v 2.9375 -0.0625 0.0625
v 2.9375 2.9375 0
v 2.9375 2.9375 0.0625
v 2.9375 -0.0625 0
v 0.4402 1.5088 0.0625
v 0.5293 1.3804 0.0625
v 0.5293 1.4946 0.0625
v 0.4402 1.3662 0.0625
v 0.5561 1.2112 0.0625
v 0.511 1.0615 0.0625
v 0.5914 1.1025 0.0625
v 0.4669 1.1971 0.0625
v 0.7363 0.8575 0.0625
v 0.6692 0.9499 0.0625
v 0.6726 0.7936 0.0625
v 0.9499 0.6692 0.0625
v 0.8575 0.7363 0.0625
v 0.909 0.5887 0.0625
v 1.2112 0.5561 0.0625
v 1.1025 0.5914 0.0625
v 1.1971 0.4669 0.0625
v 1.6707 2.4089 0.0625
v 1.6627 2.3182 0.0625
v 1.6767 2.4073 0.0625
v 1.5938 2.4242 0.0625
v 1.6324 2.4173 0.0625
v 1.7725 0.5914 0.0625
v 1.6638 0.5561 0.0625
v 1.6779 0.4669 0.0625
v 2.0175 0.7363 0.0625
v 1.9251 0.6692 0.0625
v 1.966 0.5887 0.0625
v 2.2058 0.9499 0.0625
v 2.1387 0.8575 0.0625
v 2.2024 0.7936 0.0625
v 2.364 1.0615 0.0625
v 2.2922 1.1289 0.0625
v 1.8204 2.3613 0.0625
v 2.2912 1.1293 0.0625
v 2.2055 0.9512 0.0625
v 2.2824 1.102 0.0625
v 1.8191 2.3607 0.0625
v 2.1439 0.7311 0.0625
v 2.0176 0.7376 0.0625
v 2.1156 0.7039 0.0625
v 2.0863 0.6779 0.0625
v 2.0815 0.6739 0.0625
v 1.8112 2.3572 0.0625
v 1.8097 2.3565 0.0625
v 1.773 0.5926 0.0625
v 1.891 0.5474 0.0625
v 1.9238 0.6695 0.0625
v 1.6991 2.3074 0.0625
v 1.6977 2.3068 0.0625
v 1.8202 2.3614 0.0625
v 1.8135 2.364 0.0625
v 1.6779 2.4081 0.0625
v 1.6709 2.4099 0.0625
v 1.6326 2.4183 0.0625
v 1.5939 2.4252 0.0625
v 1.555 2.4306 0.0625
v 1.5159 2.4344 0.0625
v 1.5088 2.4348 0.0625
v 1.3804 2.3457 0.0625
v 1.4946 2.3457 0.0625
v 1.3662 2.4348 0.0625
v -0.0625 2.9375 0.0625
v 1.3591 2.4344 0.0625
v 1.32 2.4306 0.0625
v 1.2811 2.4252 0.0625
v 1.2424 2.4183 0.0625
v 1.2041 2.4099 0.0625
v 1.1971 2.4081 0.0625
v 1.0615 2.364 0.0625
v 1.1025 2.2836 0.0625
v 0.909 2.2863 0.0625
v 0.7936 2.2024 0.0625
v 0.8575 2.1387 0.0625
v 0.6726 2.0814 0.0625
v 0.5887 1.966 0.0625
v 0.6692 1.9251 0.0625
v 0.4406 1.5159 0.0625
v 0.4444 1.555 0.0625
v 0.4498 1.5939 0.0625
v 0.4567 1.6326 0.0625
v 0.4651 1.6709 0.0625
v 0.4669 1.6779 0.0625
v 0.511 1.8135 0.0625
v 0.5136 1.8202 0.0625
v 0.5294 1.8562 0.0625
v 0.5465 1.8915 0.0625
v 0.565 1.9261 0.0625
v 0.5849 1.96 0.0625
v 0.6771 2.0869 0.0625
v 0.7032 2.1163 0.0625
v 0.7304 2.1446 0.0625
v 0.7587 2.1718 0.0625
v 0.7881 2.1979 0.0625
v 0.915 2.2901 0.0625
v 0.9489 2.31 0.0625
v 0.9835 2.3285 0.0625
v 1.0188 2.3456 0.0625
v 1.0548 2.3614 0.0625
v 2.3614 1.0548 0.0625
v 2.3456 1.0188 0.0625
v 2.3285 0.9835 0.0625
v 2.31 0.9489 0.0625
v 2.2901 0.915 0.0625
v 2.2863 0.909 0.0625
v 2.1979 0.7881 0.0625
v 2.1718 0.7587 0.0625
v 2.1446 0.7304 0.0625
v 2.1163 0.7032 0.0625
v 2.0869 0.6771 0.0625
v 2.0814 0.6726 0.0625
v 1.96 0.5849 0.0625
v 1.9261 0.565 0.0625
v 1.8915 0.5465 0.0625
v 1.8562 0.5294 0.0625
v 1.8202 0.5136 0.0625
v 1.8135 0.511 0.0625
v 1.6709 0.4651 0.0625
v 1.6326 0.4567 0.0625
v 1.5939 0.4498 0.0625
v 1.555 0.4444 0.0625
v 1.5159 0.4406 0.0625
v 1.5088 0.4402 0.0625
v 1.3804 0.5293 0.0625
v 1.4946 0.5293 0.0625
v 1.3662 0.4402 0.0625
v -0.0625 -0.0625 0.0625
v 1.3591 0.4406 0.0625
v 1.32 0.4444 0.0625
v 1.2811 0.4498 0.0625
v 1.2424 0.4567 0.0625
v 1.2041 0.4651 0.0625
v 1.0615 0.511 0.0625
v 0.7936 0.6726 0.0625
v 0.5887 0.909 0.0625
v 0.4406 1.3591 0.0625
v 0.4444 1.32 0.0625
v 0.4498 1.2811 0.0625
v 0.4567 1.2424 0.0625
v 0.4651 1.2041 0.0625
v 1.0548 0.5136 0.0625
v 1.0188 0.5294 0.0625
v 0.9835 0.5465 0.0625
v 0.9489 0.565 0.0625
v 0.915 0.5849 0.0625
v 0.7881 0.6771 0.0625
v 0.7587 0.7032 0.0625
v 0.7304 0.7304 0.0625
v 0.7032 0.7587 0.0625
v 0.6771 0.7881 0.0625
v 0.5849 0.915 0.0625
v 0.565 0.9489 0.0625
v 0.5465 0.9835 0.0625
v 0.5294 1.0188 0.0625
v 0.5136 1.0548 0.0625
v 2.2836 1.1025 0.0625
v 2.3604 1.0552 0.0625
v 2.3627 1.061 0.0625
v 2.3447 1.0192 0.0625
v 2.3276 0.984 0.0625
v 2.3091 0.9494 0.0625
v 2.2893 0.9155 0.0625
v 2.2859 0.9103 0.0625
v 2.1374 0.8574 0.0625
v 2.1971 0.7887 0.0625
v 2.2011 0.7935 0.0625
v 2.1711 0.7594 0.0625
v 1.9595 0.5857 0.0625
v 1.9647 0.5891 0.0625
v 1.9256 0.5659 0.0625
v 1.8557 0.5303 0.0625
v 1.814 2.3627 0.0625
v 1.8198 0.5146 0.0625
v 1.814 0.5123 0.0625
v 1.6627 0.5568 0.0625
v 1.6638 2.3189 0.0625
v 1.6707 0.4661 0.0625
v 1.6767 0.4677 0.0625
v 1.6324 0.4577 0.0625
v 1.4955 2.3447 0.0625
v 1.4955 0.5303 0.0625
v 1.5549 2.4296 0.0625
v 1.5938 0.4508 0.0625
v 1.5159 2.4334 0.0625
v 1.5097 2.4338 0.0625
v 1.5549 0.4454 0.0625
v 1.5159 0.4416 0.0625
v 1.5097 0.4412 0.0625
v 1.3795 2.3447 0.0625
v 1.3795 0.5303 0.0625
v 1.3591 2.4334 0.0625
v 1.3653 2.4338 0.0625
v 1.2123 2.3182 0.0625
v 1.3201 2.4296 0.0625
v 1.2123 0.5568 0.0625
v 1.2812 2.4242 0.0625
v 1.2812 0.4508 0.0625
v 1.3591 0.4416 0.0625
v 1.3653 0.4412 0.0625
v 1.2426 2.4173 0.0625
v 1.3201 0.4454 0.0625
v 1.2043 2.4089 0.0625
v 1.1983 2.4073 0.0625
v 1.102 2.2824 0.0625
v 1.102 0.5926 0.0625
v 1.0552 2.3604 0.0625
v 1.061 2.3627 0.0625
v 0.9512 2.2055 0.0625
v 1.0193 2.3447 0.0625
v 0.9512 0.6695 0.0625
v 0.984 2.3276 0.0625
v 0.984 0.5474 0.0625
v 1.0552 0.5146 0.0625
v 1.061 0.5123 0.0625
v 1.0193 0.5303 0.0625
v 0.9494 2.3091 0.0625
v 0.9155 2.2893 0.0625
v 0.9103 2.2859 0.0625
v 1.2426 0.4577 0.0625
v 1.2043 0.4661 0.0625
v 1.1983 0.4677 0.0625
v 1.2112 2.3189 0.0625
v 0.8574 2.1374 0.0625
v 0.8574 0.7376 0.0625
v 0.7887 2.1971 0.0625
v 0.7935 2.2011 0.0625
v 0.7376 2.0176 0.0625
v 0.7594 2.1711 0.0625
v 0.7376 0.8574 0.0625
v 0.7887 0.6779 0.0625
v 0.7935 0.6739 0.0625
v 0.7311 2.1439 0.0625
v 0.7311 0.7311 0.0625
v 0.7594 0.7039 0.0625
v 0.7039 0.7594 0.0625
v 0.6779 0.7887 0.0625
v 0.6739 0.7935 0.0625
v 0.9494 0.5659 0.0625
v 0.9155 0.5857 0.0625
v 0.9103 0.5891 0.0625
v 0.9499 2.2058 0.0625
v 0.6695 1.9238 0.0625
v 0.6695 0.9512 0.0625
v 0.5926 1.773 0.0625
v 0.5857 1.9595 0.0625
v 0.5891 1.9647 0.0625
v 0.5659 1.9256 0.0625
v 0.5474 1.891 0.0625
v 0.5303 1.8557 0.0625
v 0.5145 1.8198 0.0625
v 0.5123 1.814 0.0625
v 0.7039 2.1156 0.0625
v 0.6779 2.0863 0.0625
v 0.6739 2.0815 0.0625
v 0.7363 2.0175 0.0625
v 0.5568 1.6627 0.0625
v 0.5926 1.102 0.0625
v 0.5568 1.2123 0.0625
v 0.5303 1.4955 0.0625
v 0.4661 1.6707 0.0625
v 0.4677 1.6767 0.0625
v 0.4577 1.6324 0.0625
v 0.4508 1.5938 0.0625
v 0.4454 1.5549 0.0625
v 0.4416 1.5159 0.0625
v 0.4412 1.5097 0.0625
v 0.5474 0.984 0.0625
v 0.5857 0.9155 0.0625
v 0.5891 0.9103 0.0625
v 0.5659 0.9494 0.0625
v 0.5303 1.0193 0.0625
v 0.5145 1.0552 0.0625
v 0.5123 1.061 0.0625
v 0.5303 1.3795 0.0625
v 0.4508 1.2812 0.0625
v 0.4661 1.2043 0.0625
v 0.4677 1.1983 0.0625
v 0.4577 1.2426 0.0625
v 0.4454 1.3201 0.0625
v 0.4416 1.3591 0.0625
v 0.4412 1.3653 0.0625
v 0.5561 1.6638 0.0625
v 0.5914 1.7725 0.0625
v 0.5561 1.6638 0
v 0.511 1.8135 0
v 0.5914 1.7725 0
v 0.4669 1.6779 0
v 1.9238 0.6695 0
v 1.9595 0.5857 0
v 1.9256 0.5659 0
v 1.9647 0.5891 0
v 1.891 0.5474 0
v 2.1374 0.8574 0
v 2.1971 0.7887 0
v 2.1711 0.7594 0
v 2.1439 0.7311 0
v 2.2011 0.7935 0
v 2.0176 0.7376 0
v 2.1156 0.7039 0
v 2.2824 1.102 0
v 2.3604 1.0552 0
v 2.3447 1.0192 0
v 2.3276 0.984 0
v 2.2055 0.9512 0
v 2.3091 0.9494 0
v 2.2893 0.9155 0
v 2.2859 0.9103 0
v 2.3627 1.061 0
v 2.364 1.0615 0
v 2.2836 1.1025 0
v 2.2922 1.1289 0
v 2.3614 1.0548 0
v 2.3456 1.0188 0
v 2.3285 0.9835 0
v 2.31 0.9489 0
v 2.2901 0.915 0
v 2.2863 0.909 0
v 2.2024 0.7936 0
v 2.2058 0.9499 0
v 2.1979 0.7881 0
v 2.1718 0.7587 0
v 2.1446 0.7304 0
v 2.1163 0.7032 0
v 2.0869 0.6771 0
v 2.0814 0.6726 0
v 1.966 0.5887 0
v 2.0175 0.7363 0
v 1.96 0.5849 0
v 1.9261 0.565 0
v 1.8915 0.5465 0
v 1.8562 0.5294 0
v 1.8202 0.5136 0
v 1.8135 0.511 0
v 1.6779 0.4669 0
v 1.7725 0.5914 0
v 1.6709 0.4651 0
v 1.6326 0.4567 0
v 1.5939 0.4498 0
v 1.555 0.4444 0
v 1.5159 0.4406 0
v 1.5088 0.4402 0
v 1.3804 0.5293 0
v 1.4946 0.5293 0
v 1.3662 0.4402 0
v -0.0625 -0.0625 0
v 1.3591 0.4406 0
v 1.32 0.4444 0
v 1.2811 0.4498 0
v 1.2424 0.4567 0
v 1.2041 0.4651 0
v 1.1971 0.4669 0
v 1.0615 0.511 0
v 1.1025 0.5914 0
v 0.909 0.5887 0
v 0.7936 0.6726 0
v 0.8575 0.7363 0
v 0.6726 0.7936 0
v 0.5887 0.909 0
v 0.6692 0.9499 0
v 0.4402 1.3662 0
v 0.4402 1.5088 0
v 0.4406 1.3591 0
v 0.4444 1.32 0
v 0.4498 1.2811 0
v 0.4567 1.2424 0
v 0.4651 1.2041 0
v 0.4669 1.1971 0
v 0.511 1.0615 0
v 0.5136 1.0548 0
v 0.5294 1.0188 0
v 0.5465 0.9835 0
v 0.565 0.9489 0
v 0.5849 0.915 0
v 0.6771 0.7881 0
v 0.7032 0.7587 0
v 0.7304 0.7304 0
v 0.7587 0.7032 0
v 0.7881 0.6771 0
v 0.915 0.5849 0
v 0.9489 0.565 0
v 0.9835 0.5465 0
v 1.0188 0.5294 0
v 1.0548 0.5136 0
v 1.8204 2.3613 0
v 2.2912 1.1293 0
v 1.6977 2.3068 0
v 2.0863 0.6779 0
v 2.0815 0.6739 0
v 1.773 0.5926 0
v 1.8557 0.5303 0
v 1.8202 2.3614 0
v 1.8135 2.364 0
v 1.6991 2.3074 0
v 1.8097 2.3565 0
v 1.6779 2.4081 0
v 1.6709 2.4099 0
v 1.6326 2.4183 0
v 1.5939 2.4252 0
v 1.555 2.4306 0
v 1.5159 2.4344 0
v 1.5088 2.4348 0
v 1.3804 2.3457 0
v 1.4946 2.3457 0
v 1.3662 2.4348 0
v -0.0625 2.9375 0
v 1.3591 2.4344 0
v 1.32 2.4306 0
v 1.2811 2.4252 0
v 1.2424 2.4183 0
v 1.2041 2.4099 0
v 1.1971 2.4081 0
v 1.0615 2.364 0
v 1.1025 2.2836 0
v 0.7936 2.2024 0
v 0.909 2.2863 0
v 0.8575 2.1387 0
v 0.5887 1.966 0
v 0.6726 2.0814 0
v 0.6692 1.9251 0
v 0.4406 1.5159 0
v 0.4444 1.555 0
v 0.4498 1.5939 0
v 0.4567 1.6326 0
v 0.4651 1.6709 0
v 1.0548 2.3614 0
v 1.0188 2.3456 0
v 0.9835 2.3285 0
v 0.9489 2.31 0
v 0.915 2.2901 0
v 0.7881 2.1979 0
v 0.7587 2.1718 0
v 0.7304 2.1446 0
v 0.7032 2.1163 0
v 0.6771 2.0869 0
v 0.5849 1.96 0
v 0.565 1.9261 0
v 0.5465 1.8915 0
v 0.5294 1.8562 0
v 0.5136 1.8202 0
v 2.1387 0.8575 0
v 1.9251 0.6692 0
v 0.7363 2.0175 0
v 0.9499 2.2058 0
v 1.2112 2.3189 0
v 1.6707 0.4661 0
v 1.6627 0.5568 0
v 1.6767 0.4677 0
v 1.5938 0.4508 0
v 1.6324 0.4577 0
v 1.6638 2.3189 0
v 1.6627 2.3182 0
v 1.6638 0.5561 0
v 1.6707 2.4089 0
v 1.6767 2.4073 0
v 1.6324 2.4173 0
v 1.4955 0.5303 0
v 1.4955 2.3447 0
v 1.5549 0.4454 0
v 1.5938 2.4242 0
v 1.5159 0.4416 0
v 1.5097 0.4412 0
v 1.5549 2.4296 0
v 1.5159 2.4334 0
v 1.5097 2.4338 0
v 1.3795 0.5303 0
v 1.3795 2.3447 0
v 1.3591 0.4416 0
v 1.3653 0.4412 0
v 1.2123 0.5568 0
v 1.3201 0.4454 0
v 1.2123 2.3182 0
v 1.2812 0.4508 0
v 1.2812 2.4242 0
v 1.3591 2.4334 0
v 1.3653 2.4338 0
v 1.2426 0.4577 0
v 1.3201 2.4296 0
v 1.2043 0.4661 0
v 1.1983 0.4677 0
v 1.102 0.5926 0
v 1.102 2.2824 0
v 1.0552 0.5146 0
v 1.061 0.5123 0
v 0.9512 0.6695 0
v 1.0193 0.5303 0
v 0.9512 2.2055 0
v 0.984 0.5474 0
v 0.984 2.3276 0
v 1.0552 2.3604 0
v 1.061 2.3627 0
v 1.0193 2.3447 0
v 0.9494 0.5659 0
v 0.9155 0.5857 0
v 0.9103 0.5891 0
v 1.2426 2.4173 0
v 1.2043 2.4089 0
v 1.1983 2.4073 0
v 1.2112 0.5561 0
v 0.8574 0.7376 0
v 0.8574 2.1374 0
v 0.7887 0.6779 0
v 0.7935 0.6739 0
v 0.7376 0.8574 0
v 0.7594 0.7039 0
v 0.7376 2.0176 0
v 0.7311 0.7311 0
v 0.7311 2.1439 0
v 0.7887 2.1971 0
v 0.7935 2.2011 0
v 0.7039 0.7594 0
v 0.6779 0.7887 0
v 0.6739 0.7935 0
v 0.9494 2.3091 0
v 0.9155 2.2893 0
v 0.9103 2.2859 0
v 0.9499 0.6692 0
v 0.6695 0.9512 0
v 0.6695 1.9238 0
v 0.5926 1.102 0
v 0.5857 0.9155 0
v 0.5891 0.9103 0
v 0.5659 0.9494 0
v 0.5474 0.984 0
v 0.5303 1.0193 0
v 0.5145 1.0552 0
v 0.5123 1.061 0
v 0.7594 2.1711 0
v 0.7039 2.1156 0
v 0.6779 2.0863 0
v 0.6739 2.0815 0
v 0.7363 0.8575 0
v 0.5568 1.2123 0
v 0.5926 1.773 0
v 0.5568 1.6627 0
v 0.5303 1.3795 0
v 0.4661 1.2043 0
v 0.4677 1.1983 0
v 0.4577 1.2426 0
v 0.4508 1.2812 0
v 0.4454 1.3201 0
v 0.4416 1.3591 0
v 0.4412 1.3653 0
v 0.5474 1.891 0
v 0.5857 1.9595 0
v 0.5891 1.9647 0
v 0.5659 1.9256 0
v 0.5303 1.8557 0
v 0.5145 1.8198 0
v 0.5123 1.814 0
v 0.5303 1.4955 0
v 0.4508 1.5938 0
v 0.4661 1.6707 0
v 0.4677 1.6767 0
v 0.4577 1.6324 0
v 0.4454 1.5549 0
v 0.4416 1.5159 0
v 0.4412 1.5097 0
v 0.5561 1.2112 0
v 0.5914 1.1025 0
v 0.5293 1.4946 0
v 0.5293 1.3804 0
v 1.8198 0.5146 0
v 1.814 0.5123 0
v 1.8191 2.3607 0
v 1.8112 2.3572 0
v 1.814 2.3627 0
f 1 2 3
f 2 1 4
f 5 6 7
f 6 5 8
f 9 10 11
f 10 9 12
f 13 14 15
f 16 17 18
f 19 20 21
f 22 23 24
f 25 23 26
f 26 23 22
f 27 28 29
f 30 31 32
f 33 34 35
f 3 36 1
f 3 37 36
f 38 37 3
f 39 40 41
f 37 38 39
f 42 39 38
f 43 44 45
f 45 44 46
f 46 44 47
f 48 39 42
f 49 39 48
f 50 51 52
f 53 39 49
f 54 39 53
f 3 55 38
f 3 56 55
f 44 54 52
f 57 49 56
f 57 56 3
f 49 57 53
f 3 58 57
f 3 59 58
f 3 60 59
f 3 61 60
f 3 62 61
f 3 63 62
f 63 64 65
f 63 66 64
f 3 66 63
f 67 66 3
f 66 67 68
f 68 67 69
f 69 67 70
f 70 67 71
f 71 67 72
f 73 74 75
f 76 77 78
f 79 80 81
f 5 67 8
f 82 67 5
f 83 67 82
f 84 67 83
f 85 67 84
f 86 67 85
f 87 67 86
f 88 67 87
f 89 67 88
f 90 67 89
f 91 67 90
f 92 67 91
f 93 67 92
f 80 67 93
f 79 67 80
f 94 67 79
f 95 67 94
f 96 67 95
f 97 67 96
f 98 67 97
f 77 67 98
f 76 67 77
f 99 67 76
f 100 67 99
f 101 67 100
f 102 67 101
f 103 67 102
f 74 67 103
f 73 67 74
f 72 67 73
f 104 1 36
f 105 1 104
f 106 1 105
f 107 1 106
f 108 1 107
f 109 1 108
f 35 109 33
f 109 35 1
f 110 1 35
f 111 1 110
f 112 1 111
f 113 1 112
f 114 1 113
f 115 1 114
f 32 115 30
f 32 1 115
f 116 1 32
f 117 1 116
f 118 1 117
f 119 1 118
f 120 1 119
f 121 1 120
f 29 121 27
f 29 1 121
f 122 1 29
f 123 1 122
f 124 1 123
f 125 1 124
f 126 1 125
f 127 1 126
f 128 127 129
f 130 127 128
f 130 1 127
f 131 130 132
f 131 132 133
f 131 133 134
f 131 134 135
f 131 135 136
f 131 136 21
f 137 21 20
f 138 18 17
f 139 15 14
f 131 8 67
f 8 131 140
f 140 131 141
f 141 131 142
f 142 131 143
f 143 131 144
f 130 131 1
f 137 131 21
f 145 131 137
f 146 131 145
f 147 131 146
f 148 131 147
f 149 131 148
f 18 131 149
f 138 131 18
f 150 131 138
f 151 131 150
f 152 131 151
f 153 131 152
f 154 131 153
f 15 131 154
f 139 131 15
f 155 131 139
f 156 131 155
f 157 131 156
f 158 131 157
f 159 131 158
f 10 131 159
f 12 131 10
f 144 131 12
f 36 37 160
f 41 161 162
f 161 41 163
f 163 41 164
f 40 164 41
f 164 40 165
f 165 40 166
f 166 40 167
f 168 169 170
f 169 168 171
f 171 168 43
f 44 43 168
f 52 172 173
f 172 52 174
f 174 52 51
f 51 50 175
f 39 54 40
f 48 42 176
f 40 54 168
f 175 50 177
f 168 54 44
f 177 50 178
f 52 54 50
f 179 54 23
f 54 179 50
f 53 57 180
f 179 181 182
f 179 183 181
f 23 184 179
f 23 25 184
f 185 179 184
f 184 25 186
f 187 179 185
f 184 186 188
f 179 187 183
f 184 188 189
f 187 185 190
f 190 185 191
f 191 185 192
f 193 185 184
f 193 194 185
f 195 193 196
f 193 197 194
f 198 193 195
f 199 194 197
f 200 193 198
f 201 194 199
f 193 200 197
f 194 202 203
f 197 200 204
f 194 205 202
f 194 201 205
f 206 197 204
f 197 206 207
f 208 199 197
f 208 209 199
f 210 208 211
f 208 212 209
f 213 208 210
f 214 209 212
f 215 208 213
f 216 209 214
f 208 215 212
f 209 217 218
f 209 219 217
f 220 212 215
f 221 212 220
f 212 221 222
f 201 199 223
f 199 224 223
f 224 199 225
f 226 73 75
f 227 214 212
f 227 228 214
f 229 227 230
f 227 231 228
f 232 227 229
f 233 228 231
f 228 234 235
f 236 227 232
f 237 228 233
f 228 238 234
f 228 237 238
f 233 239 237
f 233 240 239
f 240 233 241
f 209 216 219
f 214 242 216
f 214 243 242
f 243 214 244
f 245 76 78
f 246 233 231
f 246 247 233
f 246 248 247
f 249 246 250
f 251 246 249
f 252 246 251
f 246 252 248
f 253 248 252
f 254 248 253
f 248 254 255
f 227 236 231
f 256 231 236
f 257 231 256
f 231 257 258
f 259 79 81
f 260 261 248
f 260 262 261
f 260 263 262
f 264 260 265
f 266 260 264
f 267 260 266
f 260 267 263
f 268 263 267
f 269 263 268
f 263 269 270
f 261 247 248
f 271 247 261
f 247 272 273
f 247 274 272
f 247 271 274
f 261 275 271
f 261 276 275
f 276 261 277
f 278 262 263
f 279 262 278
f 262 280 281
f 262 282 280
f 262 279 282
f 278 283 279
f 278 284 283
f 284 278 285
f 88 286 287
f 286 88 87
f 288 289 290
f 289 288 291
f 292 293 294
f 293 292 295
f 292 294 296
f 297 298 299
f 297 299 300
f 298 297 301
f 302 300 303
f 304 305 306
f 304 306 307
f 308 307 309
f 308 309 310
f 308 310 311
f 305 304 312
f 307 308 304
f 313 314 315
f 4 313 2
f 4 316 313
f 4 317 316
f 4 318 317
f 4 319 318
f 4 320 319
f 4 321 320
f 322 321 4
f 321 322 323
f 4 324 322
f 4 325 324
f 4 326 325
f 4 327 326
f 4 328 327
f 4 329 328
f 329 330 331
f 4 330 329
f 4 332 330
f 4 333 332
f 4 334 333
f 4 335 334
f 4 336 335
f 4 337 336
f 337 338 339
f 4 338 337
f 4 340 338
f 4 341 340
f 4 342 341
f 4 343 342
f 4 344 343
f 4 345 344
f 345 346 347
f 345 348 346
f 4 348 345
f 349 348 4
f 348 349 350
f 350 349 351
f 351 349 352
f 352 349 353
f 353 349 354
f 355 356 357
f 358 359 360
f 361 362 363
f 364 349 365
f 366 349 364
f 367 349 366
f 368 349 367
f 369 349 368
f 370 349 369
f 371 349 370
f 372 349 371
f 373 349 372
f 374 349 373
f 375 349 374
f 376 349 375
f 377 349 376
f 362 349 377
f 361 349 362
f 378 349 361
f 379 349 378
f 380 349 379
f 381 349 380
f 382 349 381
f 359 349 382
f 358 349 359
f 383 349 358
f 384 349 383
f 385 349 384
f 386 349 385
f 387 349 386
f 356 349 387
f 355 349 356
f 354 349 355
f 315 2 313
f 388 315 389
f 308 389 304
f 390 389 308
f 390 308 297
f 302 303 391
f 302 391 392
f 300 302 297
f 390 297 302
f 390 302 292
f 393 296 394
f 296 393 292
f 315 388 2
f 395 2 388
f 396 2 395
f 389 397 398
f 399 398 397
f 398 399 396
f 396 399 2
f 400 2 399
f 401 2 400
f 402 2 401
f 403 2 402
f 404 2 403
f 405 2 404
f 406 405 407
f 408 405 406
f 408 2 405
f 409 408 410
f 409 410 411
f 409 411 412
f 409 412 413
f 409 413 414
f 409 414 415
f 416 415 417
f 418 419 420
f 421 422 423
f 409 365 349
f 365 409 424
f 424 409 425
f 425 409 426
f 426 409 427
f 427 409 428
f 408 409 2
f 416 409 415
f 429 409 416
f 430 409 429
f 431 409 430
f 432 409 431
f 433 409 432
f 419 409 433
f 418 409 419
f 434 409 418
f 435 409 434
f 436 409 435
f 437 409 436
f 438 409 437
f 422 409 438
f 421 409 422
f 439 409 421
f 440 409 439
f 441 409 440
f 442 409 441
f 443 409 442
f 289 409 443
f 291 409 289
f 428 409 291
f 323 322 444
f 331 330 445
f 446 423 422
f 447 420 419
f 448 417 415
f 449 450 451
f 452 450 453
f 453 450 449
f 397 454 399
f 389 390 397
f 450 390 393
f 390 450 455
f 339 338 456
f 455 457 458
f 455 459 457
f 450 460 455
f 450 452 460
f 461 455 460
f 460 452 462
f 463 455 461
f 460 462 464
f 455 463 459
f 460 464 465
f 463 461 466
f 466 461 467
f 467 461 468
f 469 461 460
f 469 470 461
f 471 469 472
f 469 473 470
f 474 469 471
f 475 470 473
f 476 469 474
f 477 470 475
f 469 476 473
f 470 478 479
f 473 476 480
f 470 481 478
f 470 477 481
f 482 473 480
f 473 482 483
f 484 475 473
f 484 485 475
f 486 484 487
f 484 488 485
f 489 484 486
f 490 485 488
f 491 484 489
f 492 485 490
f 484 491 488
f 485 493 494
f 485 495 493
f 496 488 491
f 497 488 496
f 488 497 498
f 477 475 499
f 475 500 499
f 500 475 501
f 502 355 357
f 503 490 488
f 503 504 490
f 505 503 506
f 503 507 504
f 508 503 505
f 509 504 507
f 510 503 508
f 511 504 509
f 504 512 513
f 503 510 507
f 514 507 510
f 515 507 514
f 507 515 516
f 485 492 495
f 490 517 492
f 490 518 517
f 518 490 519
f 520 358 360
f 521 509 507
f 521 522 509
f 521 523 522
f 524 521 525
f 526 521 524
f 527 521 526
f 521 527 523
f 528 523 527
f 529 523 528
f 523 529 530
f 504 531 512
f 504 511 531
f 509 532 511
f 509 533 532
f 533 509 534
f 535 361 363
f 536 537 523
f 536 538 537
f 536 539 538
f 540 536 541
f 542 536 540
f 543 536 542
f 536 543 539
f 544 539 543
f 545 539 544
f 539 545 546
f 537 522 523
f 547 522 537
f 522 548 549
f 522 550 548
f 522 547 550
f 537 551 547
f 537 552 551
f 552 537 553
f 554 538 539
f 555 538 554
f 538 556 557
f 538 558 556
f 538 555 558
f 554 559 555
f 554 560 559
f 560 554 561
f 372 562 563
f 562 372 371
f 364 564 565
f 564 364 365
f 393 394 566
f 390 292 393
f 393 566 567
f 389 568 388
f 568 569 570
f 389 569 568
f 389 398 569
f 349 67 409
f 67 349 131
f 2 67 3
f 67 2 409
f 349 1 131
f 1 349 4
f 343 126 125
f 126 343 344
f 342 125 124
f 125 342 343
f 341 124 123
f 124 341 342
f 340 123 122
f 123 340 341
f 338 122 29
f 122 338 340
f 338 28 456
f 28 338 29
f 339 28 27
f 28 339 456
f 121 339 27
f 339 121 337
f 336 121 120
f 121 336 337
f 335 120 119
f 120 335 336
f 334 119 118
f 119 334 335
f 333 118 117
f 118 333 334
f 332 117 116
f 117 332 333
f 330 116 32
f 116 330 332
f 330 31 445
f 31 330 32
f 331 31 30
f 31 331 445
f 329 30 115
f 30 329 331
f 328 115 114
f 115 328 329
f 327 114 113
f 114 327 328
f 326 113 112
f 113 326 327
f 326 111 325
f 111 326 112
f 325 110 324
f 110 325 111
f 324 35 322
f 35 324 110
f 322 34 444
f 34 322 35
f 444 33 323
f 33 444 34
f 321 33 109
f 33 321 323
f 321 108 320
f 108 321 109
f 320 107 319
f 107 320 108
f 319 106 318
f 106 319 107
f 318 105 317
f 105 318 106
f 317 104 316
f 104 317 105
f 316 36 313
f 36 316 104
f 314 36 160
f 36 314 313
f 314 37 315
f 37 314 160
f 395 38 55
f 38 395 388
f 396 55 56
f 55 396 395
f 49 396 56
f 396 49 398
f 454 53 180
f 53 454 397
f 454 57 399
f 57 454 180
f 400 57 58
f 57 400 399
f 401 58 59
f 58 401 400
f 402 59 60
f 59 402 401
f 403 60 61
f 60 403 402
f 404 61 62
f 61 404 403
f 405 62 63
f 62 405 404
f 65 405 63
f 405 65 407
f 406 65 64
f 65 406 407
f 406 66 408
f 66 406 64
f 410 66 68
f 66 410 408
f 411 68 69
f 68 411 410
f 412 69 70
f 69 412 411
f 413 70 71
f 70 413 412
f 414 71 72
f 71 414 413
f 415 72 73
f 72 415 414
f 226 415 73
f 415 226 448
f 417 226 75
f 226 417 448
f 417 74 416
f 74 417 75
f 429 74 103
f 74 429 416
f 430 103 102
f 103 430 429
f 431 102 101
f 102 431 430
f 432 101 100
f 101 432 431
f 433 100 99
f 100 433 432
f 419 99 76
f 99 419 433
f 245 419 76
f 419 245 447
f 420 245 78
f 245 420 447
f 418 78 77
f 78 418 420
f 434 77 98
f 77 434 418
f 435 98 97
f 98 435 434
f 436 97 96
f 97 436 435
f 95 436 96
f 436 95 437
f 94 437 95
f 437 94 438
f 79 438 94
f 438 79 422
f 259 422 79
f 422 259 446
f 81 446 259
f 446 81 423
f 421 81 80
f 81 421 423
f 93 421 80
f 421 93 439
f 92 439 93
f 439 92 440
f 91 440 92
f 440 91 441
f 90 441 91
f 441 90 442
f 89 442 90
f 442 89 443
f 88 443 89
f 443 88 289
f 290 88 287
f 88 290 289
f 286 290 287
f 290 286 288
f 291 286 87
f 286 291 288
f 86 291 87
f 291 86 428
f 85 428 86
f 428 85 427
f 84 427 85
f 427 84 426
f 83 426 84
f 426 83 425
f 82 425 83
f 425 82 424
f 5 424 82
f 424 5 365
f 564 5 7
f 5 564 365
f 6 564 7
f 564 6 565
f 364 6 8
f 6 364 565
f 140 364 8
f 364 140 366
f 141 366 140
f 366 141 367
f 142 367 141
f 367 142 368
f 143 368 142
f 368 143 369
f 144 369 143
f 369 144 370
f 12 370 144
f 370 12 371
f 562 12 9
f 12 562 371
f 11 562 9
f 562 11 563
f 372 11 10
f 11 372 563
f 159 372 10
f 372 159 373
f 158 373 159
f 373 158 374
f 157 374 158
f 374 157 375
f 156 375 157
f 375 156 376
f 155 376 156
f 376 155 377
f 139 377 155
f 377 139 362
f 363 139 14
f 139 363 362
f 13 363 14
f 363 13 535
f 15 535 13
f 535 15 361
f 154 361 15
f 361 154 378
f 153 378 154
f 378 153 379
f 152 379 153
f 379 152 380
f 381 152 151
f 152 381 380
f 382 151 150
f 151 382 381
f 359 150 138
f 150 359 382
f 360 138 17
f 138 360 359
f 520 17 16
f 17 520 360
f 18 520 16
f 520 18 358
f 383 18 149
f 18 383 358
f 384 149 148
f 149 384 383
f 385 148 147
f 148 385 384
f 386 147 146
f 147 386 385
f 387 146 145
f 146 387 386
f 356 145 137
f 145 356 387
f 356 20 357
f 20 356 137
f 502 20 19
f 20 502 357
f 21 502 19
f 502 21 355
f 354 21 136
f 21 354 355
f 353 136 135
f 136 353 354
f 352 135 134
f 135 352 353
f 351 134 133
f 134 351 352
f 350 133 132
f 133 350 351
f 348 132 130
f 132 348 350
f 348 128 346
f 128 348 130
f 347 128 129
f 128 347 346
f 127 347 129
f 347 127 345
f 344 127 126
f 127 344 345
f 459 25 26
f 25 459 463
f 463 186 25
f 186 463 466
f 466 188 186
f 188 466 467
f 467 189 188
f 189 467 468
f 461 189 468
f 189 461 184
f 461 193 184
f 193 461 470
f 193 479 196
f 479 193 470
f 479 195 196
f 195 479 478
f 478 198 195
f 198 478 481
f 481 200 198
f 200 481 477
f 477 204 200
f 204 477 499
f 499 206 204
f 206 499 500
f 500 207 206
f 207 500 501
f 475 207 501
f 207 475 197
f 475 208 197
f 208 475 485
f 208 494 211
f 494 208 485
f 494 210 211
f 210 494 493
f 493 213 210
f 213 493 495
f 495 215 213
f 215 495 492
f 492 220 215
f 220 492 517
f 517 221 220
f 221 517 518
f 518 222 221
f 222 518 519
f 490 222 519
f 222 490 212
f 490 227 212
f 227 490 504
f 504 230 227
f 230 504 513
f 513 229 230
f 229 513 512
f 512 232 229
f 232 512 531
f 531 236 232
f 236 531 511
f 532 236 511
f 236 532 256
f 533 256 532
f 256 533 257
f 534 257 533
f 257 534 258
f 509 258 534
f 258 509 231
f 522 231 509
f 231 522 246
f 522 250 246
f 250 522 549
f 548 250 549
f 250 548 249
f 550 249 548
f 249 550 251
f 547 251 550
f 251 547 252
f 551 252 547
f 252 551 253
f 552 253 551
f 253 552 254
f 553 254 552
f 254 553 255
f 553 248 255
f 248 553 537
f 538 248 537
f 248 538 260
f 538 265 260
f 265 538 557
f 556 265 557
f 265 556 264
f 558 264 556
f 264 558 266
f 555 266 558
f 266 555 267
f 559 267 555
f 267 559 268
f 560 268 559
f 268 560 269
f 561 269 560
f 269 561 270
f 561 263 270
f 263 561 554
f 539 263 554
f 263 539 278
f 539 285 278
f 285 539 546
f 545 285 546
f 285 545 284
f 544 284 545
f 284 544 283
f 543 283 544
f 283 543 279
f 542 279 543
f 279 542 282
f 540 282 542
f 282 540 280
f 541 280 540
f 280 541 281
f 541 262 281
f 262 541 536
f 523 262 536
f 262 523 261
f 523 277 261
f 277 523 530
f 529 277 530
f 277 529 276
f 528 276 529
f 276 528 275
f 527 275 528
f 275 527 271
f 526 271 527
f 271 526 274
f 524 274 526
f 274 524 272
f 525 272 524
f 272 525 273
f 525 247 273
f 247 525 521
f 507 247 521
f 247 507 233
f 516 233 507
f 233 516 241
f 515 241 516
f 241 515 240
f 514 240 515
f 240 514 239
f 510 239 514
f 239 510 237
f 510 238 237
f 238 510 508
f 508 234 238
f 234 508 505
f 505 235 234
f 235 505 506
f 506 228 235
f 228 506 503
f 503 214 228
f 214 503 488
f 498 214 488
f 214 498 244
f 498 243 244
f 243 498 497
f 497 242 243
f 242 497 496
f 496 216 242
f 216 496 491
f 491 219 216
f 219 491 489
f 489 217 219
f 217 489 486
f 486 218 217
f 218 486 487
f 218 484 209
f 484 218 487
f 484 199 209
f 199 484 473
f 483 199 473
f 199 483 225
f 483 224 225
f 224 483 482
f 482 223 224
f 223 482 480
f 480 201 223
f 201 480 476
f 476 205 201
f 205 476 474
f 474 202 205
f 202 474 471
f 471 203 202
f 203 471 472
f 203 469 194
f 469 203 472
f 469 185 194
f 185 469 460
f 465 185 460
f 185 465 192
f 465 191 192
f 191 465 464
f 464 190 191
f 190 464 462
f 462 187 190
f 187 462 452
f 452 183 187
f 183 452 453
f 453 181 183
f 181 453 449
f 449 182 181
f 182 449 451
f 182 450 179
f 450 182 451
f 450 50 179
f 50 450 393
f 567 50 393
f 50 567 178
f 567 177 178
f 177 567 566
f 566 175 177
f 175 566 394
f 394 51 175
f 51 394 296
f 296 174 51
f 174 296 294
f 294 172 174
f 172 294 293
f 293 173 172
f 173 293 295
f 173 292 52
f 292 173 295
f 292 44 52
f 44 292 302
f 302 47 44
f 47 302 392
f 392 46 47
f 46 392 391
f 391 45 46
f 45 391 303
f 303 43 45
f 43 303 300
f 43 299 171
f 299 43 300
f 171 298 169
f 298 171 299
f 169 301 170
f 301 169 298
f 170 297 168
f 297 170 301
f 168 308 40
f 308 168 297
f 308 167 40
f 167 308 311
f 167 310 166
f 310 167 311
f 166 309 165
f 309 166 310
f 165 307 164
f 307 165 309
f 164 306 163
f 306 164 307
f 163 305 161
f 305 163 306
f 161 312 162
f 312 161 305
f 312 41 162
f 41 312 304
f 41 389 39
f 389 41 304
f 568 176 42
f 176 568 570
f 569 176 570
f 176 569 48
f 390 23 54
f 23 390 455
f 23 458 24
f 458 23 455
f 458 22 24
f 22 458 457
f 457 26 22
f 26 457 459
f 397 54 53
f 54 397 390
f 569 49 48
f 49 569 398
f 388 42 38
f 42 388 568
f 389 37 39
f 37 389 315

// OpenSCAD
// file: sub_innergears.scad
// sub_innergears.scad — shared inner gear ring (ring with inward-pointing teeth)
// Requires caller to define: plate_w, plate_d, plate_h (see sub_base_plate.scad)
// Units: inches
//
// Usage — must be `include`, positioned after sub_base_plate.scad and before any
// code that references gear_r_tip/gear_r_root/gear_r_bore:
//   include <sub_base_plate.scad>
//   include <sub_innergears.scad>
//   gear("darkred");
//   gear_bore("lightgray");
//
// gear(c) and gear_bore(c) take a color string so tiles with different gear
// colors (e.g. darkred vs darkgreen) can share this same file.

gear_r_tip  = 1.18;   // outer edge of ring (plain)
gear_r_root = 1.00;   // ring inner edge; teeth root here
gear_r_bore = 0.82;   // bore radius / tooth tip depth
gear_n      = 20;
tooth_hw    = 4.5;
tooth_tip_f = 0.80;

// ── Gear 2D helpers ───────────────────────────────────────────────────────────

module gear_tooth_2d() {
    shift   = (gear_r_root - gear_r_bore) / 2;
    r_outer = gear_r_root + shift;
    r_inner = gear_r_bore + shift;
    polygon([
        [r_outer * cos(-tooth_hw),               r_outer * sin(-tooth_hw)],
        [r_inner * cos(-tooth_hw * tooth_tip_f),  r_inner * sin(-tooth_hw * tooth_tip_f)],
        [r_inner * cos( tooth_hw * tooth_tip_f),  r_inner * sin( tooth_hw * tooth_tip_f)],
        [r_outer * cos( tooth_hw),               r_outer * sin( tooth_hw)],
    ]);
}

module gear_2d() {
    circle(r = gear_r_tip, $fn = 160);
}

module bore_2d() {
    pitch = 360 / gear_n;
    difference() {
        circle(r = gear_r_root, $fn = 160);
        for (i = [0:gear_n - 1]) rotate([0, 0, i * pitch]) gear_tooth_2d();
    }
}

// ── Gear holes & gear ────────────────────────────────────────────────────────

module gear_holes() {
    translate([plate_w / 2, plate_d / 2, -1])
    linear_extrude(plate_h + 2)
    difference() {
        gear_2d();
        bore_2d();
    }
}

module gear(c) {
    color(c)
    translate([plate_w / 2, plate_d / 2, 0])
    linear_extrude(plate_h)
    difference() { gear_2d(); bore_2d(); }
}

// ── Gear bore hole & gear bore ────────────────────────────────────────────────

module gear_bore_holes() {
    translate([plate_w / 2, plate_d / 2, -1])
    linear_extrude(plate_h + 2)
    bore_2d();
}

module gear_bore(c) {
    color(c)
    translate([plate_w / 2, plate_d / 2, 0])
    linear_extrude(plate_h)
    offset(delta = -0.001) bore_2d();
}
// file: sub_base_plate.scad
// sub_base_plate.scad — shared tile-building blocks: plate, rivets, edge ID marks,
// and the common plate/hole dimensional constants used by every tile.
// Units: inches
//
// Usage — must be `include`, not `use`, and the include line must come
// before any code in the caller that references plate_w/plate_d/plate_h/
// frame_w/hole_d/hole_r: a variable defined only inside an included file is
// invisible to code positioned before the include statement.
//   include <sub_base_plate.scad>
//   plate(["red", undef, "blue", undef, undef, "green"]);
//
// plate(colors) is the main entry point: it builds the complete base tile in
// one call — the frame with edge ID marks, the darkgray plate, and the
// lightgray rivet ring (40 rivets, 10 per side, corners shared). colors is the
// same 6-slot frame_with_id() array described below.
//
// frame_with_id() colors are applied left-to-right (−x to +x), repeated
// identically on all four edges. Bottom and right edges read the array in
// reverse (slot 5-i) so the pattern stays consistent when the tile is flipped.
// Any position left as undef or omitted defaults to black. 6 regions span the
// straight run of each edge (corners always stay solid black). A thin black
// layer covers the marks on the top face; marks are visible from the edge.

plate_w = 2 + 7/8;
plate_d = 2 + 7/8;
plate_h = 1/16;
frame_w = 1/16;
hole_d  = 3/32;
hole_r  = hole_d / 2;

module rivet_holes() {
    spacing_x = plate_w / 10;
    spacing_y = plate_d / 10;
    inset_x   = spacing_x / 2;
    inset_y   = spacing_y / 2;
    for (i = [0:9]) translate([inset_x + i * spacing_x, inset_y,           -1]) cylinder(h = plate_h + 2, r = hole_r, $fn = 20);
    for (i = [0:9]) translate([inset_x + i * spacing_x, plate_d - inset_y, -1]) cylinder(h = plate_h + 2, r = hole_r, $fn = 20);
    for (i = [0:9]) translate([inset_x,           inset_y + i * spacing_y, -1]) cylinder(h = plate_h + 2, r = hole_r, $fn = 20);
    for (i = [0:9]) translate([plate_w - inset_x, inset_y + i * spacing_y, -1]) cylinder(h = plate_h + 2, r = hole_r, $fn = 20);
}

module rivets() {
    spacing_x = plate_w / 10;
    spacing_y = plate_d / 10;
    inset_x   = spacing_x / 2;
    inset_y   = spacing_y / 2;
    color("lightgray") {
        for (i = [0:9]) translate([inset_x + i * spacing_x, inset_y,           0]) cylinder(h = plate_h, r = hole_r, $fn = 20);
        for (i = [0:9]) translate([inset_x + i * spacing_x, plate_d - inset_y, 0]) cylinder(h = plate_h, r = hole_r, $fn = 20);
        for (i = [0:9]) translate([inset_x,           inset_y + i * spacing_y, 0]) cylinder(h = plate_h, r = hole_r, $fn = 20);
        for (i = [0:9]) translate([plate_w - inset_x, inset_y + i * spacing_y, 0]) cylinder(h = plate_h, r = hole_r, $fn = 20);
    }
}

module frame_with_id(colors = []) {
    id_cover = plate_h / 8;
    region_w = plate_w / 6;
    region_d = plate_d / 6;
    mark_h   = plate_h - id_cover;

    color("black")
    difference() {
        translate([-frame_w, -frame_w, 0])
            cube([plate_w + 2 * frame_w, plate_d + 2 * frame_w, plate_h]);
        translate([0, 0, -0.001])
            cube([plate_w, plate_d, plate_h + 0.002]);
        // top/bottom/left/right straight runs only — corners stay solid black
        translate([0, plate_d - 0.001, -0.001])
            cube([plate_w, frame_w + 0.002, plate_h + 0.002]);
        translate([0, -frame_w - 0.001, -0.001])
            cube([plate_w, frame_w + 0.002, plate_h + 0.002]);
        translate([-frame_w - 0.001, 0, -0.001])
            cube([frame_w + 0.002, plate_d, plate_h + 0.002]);
        translate([plate_w - 0.001, 0, -0.001])
            cube([frame_w + 0.002, plate_d, plate_h + 0.002]);
    }

    for (i = [0:5]) {
        c     = (colors[i] != undef) ? colors[i] : "black";

        // top edge
        color(c) translate([i * region_w, plate_d, 0]) cube([region_w, frame_w, mark_h]);
        color("black") translate([i * region_w, plate_d, mark_h]) cube([region_w, frame_w, id_cover]);

        // bottom edge (reversed)
        color(c) translate([(5-i) * region_w, -frame_w, 0]) cube([region_w, frame_w, mark_h]);
        color("black") translate([(5-i) * region_w, -frame_w, mark_h]) cube([region_w, frame_w, id_cover]);

        // left edge
        color(c) translate([-frame_w, i * region_d, 0]) cube([frame_w, region_d, mark_h]);
        color("black") translate([-frame_w, i * region_d, mark_h]) cube([frame_w, region_d, id_cover]);

        // right edge (reversed)
        color(c) translate([plate_w, (5-i) * region_d, 0]) cube([frame_w, region_d, mark_h]);
        color("black") translate([plate_w, (5-i) * region_d, mark_h]) cube([frame_w, region_d, id_cover]);
    }
}

module plate(colors = []) {
    frame_with_id(colors);
    union() {
        difference() {
            color("darkgray") cube([plate_w, plate_d, plate_h]);
            rivet_holes();
        }
        rivets();
    }
}
// file: sub_element100.scad
// sub_element100.scad — shared assembly for element100 flag tile variants
// Requires caller to define: plate_colors (6-slot frame color array),
// label_num (number painted on the flag)
// Units: inches

include <sub_base_plate.scad>
include <sub_innergears.scad>

// Pole — same inset_x gap from right rivet column as rivets are from edge
pole_r   = 0.04;
pole_cx  = plate_w - plate_w / 10;
pole_y1  = (plate_d / 20) + hole_r + 0.01;
pole_y2  = plate_d - (plate_d / 20) - hole_r - 0.01;

// Pennant — 2/3 pole height, top at pole top, tip extends well across gear
flag_base_x  = pole_cx;
flag_top_y   = pole_y2;
flag_bot_y   = pole_y2 - (pole_y2 - pole_y1) * 2 / 3;
flag_tip_x   = plate_w / 2 - gear_r_tip * 0.60;
flag_mid_y   = (flag_top_y + flag_bot_y) / 2;
outline_t    = 0.025;

// ── Flag 2D helpers ───────────────────────────────────────────────────────────

module flag_pennant_2d() {
    polygon([
        [flag_base_x, flag_top_y],
        [flag_base_x, flag_bot_y],
        [flag_tip_x,  flag_mid_y]
    ]);
}

module flag_label_2d(label) {
    translate([flag_base_x + (flag_tip_x - flag_base_x) * 0.38, flag_mid_y])
    text(label, size = 0.65, halign = "center", valign = "center",
         font = "Liberation Sans:style=Bold");
}

// ── Flag outline hole & flag outline ─────────────────────────────────────────

module flag_outline_holes() {
    translate([0, 0, -1])
    linear_extrude(plate_h + 2)
    difference() {
        offset(delta = outline_t) flag_pennant_2d();
        flag_pennant_2d();
    }
}

module flag_outline() {
    color("darkgray")
    linear_extrude(plate_h)
    difference() {
        offset(delta = outline_t) flag_pennant_2d();
        flag_pennant_2d();
    }
}

// ── Flag pole hole, flag hole → flag pole, flag ───────────────────────────────

module flag_pole_holes() {
    translate([pole_cx - pole_r, pole_y1, -1])
    cube([pole_r * 2, pole_y2 - pole_y1, plate_h + 2]);
}

module flag_pole() {
    color("red")
    translate([pole_cx - pole_r, pole_y1, 0])
    cube([pole_r * 2, pole_y2 - pole_y1, plate_h]);
}

module flag_holes() {
    translate([0, 0, -1])
    linear_extrude(plate_h + 2)
    flag_pennant_2d();
}

module flag() {
    color("red")
    linear_extrude(plate_h)
    flag_pennant_2d();
}

// ── Label hole → label ────────────────────────────────────────────────────────

module label_holes(label) {
    translate([0, 0, -1])
    linear_extrude(plate_h + 2)
    flag_label_2d(label);
}

module flag_label(label) {
    color("white")
    linear_extrude(plate_h)
    flag_label_2d(label);
}

// ── Assembly ──────────────────────────────────────────────────────────────────
// Each level: difference() cuts the holes INTO the running assembly,
//             union() then adds the feature that fills those holes.
// Innermost = first step; outermost = last step.

union() {                                           // step 5: add label
    difference() {
        union() {                                   // step 4: add flag pole & flag
            difference() {
                union() {                           // step 3: add flag outline
                    difference() {
                        union() {                   // step 2: add gear bore
                            difference() {
                                union() {           // step 1: add gear
                                    difference() {
                                        plate(plate_colors);   // step 0: plate (frame + rivets)
                                        gear_holes();       // cut gear holes
                                    }
                                    gear("darkred");        // fill with gear
                                }
                                gear_bore_holes();          // cut gear bore hole
                            }
                            gear_bore("lightgray");         // fill with gear bore
                        }
                        flag_outline_holes();               // cut flag outline hole
                    }
                    flag_outline();                         // fill with flag outline
                }
                flag_pole_holes();                          // cut flag pole hole
                flag_holes();                               // cut flag hole
            }
            flag_pole();                                    // fill with flag pole
            flag();                                         // fill with flag
        }
        label_holes(label_num);                             // cut label hole
    }
    flag_label(label_num);                                  // fill with label
}
// main file
// element100-5.scad
// Flag square tile variant — gear with pennant flag, number "5" on flag.

plate_colors = ["red", "red", "red", "red", undef, "red"];
label_num    = "5";

include <sub_element100.scad>
